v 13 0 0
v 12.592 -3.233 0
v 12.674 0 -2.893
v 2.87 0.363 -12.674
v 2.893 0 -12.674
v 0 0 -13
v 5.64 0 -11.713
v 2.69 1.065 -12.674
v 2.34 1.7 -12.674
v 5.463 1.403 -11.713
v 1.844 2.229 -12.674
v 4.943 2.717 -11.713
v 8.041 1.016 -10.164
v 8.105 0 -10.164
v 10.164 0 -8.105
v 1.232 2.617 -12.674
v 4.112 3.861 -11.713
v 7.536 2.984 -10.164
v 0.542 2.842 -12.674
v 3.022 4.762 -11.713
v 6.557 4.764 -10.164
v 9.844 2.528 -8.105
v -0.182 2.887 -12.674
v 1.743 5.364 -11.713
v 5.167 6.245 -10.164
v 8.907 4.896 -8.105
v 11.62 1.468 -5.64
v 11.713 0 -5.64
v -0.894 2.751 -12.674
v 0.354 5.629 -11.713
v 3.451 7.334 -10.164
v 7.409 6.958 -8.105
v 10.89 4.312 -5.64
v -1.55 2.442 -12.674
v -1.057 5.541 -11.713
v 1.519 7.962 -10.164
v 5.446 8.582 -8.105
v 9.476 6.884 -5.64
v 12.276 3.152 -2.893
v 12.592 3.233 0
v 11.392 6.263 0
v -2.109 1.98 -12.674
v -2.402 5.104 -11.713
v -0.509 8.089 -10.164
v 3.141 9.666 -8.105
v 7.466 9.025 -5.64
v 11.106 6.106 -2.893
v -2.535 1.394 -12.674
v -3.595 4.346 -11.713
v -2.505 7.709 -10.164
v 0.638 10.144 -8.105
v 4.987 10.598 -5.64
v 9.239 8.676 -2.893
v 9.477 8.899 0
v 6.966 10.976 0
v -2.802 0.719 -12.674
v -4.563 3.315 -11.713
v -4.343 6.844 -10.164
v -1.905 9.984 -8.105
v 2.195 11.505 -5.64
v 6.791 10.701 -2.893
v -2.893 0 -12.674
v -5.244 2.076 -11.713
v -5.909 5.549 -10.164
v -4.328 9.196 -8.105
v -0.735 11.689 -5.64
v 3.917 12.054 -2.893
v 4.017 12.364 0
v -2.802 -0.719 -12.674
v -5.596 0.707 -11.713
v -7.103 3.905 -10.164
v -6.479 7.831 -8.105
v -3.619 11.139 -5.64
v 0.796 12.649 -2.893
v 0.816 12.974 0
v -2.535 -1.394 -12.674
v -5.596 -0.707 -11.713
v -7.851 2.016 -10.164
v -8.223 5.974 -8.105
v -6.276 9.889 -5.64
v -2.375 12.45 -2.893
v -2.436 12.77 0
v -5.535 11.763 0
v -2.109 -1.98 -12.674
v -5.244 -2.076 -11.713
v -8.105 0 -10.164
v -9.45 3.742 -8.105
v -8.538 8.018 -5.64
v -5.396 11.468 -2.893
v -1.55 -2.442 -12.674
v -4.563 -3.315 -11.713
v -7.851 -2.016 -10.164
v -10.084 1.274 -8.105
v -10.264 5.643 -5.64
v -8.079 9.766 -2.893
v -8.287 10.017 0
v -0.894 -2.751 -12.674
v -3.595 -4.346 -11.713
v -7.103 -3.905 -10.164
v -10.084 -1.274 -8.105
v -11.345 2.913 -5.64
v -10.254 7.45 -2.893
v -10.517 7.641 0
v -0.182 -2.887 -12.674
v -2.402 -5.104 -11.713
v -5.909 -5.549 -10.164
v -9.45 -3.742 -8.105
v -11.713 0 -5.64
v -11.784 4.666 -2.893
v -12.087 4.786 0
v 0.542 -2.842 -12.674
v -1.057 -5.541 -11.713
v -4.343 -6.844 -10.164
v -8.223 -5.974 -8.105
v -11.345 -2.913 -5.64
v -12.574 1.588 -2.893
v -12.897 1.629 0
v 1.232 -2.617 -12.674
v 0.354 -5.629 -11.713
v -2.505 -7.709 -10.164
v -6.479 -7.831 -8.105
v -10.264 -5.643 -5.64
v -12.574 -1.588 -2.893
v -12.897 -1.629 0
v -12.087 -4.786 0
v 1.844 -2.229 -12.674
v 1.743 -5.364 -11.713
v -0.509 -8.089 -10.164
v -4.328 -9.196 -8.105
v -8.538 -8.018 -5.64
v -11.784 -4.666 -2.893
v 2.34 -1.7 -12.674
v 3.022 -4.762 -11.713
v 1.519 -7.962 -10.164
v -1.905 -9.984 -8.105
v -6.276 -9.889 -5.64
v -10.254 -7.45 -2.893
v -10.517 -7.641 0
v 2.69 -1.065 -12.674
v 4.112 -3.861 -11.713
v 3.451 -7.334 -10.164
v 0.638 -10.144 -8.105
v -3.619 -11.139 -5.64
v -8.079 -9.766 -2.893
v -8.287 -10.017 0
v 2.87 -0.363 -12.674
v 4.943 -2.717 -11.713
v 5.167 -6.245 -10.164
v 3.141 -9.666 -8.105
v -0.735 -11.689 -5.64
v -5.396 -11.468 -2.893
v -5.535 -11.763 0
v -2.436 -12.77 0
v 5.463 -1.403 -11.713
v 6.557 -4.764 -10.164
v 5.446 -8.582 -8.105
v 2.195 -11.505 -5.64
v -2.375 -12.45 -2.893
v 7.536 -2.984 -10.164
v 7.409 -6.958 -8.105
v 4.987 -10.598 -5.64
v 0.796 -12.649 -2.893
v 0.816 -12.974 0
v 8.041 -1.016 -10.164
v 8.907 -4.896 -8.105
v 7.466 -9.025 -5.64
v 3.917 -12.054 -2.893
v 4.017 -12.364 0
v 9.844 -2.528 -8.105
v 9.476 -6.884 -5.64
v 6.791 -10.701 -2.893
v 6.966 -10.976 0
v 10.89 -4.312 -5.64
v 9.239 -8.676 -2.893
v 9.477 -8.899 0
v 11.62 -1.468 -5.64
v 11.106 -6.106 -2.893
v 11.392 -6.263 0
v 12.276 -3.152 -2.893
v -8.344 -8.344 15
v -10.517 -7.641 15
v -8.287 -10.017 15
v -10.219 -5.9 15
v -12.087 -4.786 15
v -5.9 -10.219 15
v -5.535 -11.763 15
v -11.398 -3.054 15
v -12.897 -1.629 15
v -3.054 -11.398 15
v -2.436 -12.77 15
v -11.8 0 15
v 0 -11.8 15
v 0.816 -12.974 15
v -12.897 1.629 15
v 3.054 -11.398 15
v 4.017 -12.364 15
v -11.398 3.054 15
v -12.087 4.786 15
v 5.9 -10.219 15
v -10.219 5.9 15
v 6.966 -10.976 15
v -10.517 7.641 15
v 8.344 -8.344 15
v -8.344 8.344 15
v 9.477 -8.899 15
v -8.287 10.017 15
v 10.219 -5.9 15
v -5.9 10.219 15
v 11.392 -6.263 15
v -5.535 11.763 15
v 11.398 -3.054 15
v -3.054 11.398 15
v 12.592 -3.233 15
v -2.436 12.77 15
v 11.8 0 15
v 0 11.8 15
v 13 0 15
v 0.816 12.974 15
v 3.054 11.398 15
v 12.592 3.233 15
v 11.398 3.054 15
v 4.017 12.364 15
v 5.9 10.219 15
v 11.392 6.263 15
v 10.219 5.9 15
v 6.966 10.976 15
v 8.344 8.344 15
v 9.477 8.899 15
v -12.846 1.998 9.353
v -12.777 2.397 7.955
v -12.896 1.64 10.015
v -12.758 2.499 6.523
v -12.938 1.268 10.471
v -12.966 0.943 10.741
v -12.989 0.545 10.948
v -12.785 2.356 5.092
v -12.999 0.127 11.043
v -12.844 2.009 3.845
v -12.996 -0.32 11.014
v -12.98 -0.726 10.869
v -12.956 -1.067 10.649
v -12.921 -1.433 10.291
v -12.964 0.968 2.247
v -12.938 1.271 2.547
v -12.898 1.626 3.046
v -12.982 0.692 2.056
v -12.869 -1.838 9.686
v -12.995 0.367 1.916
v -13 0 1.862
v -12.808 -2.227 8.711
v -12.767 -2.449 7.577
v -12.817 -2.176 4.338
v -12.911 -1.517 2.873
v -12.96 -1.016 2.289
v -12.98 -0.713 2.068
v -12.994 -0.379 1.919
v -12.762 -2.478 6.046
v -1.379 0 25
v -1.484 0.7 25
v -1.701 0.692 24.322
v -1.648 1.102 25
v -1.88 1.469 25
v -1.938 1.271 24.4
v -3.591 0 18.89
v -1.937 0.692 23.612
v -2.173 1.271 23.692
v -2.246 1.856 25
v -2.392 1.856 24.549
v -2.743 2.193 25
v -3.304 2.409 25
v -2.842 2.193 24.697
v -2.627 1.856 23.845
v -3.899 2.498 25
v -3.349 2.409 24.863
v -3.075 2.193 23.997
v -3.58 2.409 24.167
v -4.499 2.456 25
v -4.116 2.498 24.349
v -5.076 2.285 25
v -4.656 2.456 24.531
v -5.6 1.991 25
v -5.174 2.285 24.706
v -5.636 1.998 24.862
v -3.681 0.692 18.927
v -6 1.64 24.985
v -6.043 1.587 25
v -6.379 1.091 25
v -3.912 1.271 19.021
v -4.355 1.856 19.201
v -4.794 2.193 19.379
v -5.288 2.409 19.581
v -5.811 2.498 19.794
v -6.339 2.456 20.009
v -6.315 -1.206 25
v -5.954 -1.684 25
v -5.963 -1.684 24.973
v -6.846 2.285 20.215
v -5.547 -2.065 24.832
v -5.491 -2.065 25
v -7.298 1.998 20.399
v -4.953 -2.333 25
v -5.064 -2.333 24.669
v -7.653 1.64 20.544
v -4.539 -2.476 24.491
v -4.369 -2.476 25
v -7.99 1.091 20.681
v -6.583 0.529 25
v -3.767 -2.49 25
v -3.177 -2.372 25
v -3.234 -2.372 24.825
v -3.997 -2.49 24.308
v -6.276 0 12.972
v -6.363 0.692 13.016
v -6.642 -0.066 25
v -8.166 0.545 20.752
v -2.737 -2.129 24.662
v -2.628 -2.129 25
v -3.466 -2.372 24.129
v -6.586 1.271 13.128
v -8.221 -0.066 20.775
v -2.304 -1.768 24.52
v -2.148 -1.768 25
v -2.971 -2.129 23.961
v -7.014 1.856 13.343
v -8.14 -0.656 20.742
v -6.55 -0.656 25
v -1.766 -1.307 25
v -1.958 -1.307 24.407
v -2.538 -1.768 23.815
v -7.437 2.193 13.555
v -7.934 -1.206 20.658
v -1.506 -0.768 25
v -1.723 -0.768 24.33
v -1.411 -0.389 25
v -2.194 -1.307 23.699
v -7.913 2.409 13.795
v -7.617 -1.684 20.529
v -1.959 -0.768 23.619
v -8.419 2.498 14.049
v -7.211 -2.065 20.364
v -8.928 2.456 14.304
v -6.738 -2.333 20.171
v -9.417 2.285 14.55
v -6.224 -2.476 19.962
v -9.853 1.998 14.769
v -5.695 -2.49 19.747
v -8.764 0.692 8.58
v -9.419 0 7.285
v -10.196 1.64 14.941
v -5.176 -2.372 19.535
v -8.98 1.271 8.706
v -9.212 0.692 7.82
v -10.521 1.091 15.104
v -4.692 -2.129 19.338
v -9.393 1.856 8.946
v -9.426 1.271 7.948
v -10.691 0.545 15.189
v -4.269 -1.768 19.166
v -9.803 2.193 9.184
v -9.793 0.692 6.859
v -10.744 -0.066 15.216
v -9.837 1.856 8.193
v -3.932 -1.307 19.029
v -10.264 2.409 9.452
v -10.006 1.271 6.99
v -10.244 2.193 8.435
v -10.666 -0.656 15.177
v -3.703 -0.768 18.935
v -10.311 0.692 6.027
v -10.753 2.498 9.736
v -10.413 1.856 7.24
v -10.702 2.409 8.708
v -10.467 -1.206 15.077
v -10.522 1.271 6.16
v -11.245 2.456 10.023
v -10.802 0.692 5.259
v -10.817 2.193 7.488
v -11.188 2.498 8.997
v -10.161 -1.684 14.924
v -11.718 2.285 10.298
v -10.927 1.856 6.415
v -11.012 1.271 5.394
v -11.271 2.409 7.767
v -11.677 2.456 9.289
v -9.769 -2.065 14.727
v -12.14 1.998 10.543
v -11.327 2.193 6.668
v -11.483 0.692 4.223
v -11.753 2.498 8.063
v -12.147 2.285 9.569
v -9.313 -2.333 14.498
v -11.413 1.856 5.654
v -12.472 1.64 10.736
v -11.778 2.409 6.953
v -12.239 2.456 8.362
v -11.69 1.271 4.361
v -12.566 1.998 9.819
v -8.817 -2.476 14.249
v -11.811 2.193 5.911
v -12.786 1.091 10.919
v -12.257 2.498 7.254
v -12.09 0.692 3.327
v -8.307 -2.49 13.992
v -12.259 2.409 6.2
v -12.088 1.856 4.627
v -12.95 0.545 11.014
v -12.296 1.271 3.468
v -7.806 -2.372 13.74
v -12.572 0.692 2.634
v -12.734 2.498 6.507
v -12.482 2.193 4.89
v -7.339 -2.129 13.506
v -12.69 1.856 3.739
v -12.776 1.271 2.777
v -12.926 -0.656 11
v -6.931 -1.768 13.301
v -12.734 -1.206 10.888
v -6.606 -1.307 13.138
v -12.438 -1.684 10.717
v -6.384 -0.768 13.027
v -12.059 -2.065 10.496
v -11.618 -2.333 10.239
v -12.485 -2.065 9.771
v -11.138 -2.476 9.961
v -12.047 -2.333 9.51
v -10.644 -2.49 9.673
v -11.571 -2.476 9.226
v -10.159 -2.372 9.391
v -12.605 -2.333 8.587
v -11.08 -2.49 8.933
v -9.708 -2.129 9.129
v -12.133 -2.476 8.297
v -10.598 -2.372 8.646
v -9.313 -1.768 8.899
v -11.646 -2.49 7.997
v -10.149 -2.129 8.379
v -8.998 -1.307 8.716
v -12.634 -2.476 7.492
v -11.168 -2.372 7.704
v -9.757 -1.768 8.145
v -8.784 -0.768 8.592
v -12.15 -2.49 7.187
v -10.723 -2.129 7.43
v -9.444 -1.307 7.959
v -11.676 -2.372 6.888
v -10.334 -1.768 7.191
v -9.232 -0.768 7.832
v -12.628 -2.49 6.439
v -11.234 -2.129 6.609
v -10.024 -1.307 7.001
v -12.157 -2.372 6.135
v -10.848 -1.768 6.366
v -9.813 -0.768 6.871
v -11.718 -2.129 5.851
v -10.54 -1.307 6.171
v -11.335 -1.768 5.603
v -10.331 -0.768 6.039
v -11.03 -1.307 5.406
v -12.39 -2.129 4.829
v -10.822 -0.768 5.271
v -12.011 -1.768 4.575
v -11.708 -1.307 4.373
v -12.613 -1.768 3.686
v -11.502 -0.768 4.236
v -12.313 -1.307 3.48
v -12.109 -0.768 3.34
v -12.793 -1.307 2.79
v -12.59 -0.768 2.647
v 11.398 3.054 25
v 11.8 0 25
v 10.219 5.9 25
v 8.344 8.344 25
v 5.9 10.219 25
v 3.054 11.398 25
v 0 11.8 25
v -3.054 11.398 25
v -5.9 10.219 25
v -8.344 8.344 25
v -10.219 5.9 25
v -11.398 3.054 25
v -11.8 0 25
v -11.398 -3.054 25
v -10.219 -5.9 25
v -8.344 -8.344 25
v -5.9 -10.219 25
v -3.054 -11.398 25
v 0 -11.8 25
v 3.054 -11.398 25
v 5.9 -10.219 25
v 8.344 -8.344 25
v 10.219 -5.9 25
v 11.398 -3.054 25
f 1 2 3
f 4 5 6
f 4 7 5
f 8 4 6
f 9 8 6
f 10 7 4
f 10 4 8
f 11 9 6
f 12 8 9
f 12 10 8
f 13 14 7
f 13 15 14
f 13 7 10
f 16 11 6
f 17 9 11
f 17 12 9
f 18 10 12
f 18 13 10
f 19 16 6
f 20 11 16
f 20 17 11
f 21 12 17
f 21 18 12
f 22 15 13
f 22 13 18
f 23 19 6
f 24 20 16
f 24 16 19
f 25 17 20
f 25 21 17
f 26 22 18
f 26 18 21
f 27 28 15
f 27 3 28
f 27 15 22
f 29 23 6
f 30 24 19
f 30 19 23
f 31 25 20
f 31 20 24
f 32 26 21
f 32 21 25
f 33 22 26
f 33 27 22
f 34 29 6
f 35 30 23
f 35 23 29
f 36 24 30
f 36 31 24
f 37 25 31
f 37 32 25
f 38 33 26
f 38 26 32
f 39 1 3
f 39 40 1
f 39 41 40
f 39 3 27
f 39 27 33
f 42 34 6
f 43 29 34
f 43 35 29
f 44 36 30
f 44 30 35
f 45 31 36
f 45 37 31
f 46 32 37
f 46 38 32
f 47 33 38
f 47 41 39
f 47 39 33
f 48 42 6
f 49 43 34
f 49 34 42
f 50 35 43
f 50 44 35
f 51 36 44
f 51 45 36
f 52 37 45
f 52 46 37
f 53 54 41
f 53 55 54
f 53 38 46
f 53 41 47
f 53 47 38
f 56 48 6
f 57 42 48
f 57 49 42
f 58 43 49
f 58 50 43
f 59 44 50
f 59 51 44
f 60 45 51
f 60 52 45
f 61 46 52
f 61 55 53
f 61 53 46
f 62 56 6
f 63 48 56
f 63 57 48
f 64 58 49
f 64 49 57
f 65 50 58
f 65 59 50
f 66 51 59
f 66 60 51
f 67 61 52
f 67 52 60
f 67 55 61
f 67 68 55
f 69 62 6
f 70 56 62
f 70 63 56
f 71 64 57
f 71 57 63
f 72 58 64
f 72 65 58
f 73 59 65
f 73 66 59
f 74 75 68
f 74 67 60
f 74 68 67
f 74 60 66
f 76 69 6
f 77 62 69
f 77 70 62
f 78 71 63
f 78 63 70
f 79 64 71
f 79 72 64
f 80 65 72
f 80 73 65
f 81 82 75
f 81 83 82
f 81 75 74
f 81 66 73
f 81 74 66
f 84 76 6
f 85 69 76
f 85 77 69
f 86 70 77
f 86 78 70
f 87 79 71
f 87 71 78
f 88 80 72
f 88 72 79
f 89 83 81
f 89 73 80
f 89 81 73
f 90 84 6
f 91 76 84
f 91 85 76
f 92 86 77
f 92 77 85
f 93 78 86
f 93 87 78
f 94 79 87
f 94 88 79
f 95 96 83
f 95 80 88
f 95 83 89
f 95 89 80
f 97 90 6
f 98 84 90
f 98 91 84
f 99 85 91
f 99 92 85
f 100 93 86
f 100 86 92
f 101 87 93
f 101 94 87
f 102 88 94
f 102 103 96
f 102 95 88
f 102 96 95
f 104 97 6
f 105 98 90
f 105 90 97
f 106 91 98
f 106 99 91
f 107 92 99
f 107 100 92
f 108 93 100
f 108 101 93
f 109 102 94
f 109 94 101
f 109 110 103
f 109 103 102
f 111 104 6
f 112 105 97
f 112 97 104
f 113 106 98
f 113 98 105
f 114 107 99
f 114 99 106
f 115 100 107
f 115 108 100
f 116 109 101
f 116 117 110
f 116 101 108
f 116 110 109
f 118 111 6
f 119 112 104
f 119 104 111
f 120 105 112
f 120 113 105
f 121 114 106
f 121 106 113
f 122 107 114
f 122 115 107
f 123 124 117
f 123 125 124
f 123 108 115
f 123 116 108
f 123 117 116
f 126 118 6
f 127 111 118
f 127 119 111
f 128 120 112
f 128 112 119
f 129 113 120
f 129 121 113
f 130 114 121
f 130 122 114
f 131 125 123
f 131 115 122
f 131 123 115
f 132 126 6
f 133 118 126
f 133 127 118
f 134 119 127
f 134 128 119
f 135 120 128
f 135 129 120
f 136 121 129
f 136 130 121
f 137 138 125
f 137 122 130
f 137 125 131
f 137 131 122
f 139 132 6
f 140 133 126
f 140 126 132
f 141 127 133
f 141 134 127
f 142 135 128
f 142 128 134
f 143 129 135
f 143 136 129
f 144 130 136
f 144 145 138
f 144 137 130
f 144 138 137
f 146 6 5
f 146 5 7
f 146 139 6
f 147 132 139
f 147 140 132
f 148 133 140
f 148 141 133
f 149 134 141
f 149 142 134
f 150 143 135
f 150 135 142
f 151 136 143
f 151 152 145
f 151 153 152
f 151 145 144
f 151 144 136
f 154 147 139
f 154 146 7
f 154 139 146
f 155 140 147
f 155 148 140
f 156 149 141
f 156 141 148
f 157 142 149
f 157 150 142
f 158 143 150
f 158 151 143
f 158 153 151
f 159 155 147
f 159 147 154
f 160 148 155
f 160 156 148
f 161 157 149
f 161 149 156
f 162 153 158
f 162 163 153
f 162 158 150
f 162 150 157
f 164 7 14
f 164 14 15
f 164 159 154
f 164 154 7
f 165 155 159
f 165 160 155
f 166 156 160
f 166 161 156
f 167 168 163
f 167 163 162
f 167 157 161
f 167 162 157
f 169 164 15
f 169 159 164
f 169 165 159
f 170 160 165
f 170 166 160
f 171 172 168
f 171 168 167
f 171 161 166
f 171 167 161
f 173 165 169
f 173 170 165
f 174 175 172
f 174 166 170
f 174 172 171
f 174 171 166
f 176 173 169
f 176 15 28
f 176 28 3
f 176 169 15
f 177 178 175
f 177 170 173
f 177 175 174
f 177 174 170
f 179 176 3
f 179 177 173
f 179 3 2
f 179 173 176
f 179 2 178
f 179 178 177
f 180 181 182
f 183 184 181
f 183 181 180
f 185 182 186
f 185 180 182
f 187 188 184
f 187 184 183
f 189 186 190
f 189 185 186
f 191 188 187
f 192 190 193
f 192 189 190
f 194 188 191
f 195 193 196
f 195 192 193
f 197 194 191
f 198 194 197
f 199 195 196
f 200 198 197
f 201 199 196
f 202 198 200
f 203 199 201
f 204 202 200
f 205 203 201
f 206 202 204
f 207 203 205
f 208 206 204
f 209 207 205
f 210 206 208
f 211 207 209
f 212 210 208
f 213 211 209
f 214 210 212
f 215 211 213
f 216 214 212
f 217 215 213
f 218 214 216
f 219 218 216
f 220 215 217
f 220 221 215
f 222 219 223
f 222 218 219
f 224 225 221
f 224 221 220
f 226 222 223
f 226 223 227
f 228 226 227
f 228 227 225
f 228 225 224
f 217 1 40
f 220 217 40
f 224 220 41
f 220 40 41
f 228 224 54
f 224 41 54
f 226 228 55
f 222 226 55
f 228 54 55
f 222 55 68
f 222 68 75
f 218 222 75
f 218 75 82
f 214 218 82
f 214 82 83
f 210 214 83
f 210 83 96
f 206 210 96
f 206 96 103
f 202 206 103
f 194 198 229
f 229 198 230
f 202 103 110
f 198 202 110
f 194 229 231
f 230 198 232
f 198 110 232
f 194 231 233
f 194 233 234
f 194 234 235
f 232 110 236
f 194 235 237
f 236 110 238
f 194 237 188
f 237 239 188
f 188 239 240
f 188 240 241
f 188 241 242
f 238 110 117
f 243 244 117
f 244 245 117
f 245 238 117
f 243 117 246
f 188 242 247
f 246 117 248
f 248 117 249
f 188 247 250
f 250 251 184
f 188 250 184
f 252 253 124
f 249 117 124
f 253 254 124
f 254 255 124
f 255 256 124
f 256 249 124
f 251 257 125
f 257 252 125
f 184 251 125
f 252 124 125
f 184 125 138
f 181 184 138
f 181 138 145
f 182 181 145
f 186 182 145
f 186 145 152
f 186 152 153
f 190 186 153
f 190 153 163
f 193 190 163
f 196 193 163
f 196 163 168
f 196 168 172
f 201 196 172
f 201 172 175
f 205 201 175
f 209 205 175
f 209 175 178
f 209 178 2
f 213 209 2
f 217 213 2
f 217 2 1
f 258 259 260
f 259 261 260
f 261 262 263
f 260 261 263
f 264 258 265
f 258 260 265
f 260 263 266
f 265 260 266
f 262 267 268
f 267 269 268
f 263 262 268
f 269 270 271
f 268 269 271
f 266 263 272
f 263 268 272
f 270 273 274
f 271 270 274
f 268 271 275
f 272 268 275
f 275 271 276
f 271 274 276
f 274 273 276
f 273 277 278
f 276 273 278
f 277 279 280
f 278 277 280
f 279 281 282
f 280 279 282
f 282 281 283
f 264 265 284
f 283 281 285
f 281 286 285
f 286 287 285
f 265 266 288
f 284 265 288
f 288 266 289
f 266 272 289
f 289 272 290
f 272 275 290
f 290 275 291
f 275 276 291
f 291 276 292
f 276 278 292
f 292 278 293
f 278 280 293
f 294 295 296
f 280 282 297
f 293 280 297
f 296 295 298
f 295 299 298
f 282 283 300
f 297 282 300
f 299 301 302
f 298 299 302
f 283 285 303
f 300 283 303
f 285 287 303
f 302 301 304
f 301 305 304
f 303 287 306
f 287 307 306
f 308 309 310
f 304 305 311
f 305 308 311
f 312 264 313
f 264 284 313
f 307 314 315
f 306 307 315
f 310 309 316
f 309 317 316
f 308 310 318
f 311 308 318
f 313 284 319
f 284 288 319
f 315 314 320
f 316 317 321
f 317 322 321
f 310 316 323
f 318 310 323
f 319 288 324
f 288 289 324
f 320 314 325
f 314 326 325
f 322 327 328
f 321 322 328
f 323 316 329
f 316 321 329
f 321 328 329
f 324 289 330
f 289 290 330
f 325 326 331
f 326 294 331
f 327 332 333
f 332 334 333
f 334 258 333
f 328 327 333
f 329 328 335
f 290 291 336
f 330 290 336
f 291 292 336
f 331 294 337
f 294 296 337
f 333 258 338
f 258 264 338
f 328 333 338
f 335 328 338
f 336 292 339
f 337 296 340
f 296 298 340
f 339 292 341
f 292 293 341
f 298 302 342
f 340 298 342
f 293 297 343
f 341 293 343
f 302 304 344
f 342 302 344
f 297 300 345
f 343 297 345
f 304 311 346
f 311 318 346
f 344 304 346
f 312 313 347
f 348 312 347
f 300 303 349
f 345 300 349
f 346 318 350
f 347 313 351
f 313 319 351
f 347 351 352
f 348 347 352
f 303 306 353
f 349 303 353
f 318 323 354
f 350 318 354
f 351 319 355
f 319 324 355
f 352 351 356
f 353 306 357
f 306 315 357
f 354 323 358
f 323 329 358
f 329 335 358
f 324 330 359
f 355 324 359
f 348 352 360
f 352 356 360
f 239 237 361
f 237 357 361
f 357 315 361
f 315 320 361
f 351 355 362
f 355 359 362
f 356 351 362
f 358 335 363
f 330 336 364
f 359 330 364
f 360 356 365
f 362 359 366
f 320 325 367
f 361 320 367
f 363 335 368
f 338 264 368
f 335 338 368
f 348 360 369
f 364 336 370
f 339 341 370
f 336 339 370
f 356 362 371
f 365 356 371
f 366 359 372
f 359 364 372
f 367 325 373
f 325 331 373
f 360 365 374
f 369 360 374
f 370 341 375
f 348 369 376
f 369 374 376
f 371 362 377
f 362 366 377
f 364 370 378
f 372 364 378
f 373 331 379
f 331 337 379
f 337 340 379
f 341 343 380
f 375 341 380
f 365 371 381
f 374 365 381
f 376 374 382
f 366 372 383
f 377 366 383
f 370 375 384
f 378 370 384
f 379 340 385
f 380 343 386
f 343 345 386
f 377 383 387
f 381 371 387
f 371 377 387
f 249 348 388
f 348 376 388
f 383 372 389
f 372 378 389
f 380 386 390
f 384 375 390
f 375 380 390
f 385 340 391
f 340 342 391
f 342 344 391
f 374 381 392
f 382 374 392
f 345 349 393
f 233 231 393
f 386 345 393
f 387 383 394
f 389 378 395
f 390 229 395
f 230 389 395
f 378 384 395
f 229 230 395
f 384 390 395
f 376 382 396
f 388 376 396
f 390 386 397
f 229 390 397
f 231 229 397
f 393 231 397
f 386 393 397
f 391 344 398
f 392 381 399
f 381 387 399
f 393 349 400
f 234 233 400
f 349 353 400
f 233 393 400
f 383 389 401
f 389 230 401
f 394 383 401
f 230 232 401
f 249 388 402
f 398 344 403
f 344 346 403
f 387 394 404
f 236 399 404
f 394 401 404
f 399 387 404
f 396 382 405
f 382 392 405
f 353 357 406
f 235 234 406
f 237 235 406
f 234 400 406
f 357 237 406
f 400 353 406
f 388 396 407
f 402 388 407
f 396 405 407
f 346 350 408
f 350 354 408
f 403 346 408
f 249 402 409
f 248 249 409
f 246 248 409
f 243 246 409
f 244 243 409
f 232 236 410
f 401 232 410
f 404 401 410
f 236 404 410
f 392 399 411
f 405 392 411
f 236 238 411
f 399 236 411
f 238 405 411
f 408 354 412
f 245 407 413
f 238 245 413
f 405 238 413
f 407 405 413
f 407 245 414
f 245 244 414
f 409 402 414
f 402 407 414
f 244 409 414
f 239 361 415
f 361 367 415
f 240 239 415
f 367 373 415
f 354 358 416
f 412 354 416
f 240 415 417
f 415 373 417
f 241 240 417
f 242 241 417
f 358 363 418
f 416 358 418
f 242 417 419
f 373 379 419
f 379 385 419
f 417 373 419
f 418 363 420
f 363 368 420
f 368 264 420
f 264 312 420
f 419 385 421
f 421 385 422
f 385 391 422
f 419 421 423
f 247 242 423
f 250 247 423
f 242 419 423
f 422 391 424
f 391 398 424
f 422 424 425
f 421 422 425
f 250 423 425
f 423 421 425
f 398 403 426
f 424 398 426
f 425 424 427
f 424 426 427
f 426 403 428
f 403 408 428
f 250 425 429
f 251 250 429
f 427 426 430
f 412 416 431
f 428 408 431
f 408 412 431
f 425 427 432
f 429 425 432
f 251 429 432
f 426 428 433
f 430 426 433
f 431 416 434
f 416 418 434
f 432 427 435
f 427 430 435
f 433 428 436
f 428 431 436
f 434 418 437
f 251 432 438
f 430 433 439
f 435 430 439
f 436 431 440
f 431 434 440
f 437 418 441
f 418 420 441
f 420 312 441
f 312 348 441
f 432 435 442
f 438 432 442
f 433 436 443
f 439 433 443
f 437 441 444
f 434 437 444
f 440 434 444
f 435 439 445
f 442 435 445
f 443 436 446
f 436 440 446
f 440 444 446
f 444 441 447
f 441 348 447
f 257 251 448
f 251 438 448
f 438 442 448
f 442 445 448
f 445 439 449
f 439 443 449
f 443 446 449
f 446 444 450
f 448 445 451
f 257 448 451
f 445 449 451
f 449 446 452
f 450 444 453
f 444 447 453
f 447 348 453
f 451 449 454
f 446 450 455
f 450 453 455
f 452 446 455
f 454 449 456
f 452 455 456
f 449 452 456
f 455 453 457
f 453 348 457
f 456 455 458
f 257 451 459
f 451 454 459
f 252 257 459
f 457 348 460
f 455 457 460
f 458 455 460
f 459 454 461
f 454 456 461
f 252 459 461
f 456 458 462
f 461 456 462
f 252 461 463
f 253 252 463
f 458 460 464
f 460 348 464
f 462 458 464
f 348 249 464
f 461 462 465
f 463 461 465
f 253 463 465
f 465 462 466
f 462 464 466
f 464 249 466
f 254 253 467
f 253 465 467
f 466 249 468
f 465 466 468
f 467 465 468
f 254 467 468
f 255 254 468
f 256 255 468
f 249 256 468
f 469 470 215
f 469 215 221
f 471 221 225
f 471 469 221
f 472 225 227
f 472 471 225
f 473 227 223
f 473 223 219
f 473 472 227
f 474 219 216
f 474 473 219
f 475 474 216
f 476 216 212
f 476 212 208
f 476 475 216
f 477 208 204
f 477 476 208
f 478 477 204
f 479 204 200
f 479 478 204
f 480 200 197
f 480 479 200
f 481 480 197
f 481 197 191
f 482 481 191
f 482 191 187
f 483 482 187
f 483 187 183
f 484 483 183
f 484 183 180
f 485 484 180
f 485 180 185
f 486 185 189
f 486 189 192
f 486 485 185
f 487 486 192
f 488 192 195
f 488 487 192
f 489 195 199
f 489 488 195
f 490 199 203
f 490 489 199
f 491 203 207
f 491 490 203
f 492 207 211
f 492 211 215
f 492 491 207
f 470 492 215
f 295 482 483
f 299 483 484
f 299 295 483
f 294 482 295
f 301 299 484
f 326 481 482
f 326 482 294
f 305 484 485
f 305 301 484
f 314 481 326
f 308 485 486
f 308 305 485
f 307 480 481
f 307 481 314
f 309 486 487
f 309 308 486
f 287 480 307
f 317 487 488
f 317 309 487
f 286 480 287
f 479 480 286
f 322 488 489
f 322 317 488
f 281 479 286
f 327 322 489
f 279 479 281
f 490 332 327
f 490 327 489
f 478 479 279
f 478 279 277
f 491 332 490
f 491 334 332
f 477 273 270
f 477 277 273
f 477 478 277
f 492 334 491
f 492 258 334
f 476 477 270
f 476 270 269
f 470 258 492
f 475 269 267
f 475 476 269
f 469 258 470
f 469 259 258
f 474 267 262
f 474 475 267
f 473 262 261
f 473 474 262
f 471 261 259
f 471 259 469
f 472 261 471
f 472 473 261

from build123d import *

# Parameters (mm, degrees)
F0_R      = 13
F1_DEPTH  = 25
F3_R      = 2.5
F7_ANGLE  = 90
F2_R      = 13
F2_R_2    = 11.8
F10_DEPTH = 10


with BuildPart() as f1:
    # F0 (on Top) → F1 (new body)
    with BuildSketch(Plane.XY):
        Circle(F0_R)
    extrude(amount=F1_DEPTH)

    # F8 (on Front) → F9 (revolve)
    with BuildSketch(Plane.XZ):
        with BuildLine():
            Line((0, 0), (0, -13))
            ThreePointArc((0, -13), (9.1923881554, -9.1923881554), (13, 0))
            Line((13, 0), (0, 0))
        make_face()
    revolve(axis=Axis((0, 0, 0), (0, 0, 1)))

    # F2 (on face) → F10 (cut)
    with BuildSketch(Plane.XY.offset(25)):
        Circle(F2_R)
        Circle(F2_R_2, mode=Mode.SUBTRACT)
    extrude(amount=-F10_DEPTH, mode=Mode.SUBTRACT)


with BuildPart() as f5:
    # F3 (on Front) → F5 (revolve)
    with BuildSketch(Plane.XZ):
        with Locations((-50, 50)):
            Circle(F3_R)
    revolve(axis=Axis((-130, 0, 0), (0, 0, 1)))


with BuildPart() as f5_1:
    # F6: moved
    add(f5.part.moved(Location((50, 0, 0))))


with BuildPart() as f5_2:
    # F7: moved
    add(f5_1.part.rotate(Axis((-88.6065643281, 0, 50), (-1, 0, 0)), F7_ANGLE))


with BuildPart() as f1_1:
    add(f1.part)

    # F11: cut F5
    add(f5_2.part, mode=Mode.SUBTRACT)


solid = f1_1.part
